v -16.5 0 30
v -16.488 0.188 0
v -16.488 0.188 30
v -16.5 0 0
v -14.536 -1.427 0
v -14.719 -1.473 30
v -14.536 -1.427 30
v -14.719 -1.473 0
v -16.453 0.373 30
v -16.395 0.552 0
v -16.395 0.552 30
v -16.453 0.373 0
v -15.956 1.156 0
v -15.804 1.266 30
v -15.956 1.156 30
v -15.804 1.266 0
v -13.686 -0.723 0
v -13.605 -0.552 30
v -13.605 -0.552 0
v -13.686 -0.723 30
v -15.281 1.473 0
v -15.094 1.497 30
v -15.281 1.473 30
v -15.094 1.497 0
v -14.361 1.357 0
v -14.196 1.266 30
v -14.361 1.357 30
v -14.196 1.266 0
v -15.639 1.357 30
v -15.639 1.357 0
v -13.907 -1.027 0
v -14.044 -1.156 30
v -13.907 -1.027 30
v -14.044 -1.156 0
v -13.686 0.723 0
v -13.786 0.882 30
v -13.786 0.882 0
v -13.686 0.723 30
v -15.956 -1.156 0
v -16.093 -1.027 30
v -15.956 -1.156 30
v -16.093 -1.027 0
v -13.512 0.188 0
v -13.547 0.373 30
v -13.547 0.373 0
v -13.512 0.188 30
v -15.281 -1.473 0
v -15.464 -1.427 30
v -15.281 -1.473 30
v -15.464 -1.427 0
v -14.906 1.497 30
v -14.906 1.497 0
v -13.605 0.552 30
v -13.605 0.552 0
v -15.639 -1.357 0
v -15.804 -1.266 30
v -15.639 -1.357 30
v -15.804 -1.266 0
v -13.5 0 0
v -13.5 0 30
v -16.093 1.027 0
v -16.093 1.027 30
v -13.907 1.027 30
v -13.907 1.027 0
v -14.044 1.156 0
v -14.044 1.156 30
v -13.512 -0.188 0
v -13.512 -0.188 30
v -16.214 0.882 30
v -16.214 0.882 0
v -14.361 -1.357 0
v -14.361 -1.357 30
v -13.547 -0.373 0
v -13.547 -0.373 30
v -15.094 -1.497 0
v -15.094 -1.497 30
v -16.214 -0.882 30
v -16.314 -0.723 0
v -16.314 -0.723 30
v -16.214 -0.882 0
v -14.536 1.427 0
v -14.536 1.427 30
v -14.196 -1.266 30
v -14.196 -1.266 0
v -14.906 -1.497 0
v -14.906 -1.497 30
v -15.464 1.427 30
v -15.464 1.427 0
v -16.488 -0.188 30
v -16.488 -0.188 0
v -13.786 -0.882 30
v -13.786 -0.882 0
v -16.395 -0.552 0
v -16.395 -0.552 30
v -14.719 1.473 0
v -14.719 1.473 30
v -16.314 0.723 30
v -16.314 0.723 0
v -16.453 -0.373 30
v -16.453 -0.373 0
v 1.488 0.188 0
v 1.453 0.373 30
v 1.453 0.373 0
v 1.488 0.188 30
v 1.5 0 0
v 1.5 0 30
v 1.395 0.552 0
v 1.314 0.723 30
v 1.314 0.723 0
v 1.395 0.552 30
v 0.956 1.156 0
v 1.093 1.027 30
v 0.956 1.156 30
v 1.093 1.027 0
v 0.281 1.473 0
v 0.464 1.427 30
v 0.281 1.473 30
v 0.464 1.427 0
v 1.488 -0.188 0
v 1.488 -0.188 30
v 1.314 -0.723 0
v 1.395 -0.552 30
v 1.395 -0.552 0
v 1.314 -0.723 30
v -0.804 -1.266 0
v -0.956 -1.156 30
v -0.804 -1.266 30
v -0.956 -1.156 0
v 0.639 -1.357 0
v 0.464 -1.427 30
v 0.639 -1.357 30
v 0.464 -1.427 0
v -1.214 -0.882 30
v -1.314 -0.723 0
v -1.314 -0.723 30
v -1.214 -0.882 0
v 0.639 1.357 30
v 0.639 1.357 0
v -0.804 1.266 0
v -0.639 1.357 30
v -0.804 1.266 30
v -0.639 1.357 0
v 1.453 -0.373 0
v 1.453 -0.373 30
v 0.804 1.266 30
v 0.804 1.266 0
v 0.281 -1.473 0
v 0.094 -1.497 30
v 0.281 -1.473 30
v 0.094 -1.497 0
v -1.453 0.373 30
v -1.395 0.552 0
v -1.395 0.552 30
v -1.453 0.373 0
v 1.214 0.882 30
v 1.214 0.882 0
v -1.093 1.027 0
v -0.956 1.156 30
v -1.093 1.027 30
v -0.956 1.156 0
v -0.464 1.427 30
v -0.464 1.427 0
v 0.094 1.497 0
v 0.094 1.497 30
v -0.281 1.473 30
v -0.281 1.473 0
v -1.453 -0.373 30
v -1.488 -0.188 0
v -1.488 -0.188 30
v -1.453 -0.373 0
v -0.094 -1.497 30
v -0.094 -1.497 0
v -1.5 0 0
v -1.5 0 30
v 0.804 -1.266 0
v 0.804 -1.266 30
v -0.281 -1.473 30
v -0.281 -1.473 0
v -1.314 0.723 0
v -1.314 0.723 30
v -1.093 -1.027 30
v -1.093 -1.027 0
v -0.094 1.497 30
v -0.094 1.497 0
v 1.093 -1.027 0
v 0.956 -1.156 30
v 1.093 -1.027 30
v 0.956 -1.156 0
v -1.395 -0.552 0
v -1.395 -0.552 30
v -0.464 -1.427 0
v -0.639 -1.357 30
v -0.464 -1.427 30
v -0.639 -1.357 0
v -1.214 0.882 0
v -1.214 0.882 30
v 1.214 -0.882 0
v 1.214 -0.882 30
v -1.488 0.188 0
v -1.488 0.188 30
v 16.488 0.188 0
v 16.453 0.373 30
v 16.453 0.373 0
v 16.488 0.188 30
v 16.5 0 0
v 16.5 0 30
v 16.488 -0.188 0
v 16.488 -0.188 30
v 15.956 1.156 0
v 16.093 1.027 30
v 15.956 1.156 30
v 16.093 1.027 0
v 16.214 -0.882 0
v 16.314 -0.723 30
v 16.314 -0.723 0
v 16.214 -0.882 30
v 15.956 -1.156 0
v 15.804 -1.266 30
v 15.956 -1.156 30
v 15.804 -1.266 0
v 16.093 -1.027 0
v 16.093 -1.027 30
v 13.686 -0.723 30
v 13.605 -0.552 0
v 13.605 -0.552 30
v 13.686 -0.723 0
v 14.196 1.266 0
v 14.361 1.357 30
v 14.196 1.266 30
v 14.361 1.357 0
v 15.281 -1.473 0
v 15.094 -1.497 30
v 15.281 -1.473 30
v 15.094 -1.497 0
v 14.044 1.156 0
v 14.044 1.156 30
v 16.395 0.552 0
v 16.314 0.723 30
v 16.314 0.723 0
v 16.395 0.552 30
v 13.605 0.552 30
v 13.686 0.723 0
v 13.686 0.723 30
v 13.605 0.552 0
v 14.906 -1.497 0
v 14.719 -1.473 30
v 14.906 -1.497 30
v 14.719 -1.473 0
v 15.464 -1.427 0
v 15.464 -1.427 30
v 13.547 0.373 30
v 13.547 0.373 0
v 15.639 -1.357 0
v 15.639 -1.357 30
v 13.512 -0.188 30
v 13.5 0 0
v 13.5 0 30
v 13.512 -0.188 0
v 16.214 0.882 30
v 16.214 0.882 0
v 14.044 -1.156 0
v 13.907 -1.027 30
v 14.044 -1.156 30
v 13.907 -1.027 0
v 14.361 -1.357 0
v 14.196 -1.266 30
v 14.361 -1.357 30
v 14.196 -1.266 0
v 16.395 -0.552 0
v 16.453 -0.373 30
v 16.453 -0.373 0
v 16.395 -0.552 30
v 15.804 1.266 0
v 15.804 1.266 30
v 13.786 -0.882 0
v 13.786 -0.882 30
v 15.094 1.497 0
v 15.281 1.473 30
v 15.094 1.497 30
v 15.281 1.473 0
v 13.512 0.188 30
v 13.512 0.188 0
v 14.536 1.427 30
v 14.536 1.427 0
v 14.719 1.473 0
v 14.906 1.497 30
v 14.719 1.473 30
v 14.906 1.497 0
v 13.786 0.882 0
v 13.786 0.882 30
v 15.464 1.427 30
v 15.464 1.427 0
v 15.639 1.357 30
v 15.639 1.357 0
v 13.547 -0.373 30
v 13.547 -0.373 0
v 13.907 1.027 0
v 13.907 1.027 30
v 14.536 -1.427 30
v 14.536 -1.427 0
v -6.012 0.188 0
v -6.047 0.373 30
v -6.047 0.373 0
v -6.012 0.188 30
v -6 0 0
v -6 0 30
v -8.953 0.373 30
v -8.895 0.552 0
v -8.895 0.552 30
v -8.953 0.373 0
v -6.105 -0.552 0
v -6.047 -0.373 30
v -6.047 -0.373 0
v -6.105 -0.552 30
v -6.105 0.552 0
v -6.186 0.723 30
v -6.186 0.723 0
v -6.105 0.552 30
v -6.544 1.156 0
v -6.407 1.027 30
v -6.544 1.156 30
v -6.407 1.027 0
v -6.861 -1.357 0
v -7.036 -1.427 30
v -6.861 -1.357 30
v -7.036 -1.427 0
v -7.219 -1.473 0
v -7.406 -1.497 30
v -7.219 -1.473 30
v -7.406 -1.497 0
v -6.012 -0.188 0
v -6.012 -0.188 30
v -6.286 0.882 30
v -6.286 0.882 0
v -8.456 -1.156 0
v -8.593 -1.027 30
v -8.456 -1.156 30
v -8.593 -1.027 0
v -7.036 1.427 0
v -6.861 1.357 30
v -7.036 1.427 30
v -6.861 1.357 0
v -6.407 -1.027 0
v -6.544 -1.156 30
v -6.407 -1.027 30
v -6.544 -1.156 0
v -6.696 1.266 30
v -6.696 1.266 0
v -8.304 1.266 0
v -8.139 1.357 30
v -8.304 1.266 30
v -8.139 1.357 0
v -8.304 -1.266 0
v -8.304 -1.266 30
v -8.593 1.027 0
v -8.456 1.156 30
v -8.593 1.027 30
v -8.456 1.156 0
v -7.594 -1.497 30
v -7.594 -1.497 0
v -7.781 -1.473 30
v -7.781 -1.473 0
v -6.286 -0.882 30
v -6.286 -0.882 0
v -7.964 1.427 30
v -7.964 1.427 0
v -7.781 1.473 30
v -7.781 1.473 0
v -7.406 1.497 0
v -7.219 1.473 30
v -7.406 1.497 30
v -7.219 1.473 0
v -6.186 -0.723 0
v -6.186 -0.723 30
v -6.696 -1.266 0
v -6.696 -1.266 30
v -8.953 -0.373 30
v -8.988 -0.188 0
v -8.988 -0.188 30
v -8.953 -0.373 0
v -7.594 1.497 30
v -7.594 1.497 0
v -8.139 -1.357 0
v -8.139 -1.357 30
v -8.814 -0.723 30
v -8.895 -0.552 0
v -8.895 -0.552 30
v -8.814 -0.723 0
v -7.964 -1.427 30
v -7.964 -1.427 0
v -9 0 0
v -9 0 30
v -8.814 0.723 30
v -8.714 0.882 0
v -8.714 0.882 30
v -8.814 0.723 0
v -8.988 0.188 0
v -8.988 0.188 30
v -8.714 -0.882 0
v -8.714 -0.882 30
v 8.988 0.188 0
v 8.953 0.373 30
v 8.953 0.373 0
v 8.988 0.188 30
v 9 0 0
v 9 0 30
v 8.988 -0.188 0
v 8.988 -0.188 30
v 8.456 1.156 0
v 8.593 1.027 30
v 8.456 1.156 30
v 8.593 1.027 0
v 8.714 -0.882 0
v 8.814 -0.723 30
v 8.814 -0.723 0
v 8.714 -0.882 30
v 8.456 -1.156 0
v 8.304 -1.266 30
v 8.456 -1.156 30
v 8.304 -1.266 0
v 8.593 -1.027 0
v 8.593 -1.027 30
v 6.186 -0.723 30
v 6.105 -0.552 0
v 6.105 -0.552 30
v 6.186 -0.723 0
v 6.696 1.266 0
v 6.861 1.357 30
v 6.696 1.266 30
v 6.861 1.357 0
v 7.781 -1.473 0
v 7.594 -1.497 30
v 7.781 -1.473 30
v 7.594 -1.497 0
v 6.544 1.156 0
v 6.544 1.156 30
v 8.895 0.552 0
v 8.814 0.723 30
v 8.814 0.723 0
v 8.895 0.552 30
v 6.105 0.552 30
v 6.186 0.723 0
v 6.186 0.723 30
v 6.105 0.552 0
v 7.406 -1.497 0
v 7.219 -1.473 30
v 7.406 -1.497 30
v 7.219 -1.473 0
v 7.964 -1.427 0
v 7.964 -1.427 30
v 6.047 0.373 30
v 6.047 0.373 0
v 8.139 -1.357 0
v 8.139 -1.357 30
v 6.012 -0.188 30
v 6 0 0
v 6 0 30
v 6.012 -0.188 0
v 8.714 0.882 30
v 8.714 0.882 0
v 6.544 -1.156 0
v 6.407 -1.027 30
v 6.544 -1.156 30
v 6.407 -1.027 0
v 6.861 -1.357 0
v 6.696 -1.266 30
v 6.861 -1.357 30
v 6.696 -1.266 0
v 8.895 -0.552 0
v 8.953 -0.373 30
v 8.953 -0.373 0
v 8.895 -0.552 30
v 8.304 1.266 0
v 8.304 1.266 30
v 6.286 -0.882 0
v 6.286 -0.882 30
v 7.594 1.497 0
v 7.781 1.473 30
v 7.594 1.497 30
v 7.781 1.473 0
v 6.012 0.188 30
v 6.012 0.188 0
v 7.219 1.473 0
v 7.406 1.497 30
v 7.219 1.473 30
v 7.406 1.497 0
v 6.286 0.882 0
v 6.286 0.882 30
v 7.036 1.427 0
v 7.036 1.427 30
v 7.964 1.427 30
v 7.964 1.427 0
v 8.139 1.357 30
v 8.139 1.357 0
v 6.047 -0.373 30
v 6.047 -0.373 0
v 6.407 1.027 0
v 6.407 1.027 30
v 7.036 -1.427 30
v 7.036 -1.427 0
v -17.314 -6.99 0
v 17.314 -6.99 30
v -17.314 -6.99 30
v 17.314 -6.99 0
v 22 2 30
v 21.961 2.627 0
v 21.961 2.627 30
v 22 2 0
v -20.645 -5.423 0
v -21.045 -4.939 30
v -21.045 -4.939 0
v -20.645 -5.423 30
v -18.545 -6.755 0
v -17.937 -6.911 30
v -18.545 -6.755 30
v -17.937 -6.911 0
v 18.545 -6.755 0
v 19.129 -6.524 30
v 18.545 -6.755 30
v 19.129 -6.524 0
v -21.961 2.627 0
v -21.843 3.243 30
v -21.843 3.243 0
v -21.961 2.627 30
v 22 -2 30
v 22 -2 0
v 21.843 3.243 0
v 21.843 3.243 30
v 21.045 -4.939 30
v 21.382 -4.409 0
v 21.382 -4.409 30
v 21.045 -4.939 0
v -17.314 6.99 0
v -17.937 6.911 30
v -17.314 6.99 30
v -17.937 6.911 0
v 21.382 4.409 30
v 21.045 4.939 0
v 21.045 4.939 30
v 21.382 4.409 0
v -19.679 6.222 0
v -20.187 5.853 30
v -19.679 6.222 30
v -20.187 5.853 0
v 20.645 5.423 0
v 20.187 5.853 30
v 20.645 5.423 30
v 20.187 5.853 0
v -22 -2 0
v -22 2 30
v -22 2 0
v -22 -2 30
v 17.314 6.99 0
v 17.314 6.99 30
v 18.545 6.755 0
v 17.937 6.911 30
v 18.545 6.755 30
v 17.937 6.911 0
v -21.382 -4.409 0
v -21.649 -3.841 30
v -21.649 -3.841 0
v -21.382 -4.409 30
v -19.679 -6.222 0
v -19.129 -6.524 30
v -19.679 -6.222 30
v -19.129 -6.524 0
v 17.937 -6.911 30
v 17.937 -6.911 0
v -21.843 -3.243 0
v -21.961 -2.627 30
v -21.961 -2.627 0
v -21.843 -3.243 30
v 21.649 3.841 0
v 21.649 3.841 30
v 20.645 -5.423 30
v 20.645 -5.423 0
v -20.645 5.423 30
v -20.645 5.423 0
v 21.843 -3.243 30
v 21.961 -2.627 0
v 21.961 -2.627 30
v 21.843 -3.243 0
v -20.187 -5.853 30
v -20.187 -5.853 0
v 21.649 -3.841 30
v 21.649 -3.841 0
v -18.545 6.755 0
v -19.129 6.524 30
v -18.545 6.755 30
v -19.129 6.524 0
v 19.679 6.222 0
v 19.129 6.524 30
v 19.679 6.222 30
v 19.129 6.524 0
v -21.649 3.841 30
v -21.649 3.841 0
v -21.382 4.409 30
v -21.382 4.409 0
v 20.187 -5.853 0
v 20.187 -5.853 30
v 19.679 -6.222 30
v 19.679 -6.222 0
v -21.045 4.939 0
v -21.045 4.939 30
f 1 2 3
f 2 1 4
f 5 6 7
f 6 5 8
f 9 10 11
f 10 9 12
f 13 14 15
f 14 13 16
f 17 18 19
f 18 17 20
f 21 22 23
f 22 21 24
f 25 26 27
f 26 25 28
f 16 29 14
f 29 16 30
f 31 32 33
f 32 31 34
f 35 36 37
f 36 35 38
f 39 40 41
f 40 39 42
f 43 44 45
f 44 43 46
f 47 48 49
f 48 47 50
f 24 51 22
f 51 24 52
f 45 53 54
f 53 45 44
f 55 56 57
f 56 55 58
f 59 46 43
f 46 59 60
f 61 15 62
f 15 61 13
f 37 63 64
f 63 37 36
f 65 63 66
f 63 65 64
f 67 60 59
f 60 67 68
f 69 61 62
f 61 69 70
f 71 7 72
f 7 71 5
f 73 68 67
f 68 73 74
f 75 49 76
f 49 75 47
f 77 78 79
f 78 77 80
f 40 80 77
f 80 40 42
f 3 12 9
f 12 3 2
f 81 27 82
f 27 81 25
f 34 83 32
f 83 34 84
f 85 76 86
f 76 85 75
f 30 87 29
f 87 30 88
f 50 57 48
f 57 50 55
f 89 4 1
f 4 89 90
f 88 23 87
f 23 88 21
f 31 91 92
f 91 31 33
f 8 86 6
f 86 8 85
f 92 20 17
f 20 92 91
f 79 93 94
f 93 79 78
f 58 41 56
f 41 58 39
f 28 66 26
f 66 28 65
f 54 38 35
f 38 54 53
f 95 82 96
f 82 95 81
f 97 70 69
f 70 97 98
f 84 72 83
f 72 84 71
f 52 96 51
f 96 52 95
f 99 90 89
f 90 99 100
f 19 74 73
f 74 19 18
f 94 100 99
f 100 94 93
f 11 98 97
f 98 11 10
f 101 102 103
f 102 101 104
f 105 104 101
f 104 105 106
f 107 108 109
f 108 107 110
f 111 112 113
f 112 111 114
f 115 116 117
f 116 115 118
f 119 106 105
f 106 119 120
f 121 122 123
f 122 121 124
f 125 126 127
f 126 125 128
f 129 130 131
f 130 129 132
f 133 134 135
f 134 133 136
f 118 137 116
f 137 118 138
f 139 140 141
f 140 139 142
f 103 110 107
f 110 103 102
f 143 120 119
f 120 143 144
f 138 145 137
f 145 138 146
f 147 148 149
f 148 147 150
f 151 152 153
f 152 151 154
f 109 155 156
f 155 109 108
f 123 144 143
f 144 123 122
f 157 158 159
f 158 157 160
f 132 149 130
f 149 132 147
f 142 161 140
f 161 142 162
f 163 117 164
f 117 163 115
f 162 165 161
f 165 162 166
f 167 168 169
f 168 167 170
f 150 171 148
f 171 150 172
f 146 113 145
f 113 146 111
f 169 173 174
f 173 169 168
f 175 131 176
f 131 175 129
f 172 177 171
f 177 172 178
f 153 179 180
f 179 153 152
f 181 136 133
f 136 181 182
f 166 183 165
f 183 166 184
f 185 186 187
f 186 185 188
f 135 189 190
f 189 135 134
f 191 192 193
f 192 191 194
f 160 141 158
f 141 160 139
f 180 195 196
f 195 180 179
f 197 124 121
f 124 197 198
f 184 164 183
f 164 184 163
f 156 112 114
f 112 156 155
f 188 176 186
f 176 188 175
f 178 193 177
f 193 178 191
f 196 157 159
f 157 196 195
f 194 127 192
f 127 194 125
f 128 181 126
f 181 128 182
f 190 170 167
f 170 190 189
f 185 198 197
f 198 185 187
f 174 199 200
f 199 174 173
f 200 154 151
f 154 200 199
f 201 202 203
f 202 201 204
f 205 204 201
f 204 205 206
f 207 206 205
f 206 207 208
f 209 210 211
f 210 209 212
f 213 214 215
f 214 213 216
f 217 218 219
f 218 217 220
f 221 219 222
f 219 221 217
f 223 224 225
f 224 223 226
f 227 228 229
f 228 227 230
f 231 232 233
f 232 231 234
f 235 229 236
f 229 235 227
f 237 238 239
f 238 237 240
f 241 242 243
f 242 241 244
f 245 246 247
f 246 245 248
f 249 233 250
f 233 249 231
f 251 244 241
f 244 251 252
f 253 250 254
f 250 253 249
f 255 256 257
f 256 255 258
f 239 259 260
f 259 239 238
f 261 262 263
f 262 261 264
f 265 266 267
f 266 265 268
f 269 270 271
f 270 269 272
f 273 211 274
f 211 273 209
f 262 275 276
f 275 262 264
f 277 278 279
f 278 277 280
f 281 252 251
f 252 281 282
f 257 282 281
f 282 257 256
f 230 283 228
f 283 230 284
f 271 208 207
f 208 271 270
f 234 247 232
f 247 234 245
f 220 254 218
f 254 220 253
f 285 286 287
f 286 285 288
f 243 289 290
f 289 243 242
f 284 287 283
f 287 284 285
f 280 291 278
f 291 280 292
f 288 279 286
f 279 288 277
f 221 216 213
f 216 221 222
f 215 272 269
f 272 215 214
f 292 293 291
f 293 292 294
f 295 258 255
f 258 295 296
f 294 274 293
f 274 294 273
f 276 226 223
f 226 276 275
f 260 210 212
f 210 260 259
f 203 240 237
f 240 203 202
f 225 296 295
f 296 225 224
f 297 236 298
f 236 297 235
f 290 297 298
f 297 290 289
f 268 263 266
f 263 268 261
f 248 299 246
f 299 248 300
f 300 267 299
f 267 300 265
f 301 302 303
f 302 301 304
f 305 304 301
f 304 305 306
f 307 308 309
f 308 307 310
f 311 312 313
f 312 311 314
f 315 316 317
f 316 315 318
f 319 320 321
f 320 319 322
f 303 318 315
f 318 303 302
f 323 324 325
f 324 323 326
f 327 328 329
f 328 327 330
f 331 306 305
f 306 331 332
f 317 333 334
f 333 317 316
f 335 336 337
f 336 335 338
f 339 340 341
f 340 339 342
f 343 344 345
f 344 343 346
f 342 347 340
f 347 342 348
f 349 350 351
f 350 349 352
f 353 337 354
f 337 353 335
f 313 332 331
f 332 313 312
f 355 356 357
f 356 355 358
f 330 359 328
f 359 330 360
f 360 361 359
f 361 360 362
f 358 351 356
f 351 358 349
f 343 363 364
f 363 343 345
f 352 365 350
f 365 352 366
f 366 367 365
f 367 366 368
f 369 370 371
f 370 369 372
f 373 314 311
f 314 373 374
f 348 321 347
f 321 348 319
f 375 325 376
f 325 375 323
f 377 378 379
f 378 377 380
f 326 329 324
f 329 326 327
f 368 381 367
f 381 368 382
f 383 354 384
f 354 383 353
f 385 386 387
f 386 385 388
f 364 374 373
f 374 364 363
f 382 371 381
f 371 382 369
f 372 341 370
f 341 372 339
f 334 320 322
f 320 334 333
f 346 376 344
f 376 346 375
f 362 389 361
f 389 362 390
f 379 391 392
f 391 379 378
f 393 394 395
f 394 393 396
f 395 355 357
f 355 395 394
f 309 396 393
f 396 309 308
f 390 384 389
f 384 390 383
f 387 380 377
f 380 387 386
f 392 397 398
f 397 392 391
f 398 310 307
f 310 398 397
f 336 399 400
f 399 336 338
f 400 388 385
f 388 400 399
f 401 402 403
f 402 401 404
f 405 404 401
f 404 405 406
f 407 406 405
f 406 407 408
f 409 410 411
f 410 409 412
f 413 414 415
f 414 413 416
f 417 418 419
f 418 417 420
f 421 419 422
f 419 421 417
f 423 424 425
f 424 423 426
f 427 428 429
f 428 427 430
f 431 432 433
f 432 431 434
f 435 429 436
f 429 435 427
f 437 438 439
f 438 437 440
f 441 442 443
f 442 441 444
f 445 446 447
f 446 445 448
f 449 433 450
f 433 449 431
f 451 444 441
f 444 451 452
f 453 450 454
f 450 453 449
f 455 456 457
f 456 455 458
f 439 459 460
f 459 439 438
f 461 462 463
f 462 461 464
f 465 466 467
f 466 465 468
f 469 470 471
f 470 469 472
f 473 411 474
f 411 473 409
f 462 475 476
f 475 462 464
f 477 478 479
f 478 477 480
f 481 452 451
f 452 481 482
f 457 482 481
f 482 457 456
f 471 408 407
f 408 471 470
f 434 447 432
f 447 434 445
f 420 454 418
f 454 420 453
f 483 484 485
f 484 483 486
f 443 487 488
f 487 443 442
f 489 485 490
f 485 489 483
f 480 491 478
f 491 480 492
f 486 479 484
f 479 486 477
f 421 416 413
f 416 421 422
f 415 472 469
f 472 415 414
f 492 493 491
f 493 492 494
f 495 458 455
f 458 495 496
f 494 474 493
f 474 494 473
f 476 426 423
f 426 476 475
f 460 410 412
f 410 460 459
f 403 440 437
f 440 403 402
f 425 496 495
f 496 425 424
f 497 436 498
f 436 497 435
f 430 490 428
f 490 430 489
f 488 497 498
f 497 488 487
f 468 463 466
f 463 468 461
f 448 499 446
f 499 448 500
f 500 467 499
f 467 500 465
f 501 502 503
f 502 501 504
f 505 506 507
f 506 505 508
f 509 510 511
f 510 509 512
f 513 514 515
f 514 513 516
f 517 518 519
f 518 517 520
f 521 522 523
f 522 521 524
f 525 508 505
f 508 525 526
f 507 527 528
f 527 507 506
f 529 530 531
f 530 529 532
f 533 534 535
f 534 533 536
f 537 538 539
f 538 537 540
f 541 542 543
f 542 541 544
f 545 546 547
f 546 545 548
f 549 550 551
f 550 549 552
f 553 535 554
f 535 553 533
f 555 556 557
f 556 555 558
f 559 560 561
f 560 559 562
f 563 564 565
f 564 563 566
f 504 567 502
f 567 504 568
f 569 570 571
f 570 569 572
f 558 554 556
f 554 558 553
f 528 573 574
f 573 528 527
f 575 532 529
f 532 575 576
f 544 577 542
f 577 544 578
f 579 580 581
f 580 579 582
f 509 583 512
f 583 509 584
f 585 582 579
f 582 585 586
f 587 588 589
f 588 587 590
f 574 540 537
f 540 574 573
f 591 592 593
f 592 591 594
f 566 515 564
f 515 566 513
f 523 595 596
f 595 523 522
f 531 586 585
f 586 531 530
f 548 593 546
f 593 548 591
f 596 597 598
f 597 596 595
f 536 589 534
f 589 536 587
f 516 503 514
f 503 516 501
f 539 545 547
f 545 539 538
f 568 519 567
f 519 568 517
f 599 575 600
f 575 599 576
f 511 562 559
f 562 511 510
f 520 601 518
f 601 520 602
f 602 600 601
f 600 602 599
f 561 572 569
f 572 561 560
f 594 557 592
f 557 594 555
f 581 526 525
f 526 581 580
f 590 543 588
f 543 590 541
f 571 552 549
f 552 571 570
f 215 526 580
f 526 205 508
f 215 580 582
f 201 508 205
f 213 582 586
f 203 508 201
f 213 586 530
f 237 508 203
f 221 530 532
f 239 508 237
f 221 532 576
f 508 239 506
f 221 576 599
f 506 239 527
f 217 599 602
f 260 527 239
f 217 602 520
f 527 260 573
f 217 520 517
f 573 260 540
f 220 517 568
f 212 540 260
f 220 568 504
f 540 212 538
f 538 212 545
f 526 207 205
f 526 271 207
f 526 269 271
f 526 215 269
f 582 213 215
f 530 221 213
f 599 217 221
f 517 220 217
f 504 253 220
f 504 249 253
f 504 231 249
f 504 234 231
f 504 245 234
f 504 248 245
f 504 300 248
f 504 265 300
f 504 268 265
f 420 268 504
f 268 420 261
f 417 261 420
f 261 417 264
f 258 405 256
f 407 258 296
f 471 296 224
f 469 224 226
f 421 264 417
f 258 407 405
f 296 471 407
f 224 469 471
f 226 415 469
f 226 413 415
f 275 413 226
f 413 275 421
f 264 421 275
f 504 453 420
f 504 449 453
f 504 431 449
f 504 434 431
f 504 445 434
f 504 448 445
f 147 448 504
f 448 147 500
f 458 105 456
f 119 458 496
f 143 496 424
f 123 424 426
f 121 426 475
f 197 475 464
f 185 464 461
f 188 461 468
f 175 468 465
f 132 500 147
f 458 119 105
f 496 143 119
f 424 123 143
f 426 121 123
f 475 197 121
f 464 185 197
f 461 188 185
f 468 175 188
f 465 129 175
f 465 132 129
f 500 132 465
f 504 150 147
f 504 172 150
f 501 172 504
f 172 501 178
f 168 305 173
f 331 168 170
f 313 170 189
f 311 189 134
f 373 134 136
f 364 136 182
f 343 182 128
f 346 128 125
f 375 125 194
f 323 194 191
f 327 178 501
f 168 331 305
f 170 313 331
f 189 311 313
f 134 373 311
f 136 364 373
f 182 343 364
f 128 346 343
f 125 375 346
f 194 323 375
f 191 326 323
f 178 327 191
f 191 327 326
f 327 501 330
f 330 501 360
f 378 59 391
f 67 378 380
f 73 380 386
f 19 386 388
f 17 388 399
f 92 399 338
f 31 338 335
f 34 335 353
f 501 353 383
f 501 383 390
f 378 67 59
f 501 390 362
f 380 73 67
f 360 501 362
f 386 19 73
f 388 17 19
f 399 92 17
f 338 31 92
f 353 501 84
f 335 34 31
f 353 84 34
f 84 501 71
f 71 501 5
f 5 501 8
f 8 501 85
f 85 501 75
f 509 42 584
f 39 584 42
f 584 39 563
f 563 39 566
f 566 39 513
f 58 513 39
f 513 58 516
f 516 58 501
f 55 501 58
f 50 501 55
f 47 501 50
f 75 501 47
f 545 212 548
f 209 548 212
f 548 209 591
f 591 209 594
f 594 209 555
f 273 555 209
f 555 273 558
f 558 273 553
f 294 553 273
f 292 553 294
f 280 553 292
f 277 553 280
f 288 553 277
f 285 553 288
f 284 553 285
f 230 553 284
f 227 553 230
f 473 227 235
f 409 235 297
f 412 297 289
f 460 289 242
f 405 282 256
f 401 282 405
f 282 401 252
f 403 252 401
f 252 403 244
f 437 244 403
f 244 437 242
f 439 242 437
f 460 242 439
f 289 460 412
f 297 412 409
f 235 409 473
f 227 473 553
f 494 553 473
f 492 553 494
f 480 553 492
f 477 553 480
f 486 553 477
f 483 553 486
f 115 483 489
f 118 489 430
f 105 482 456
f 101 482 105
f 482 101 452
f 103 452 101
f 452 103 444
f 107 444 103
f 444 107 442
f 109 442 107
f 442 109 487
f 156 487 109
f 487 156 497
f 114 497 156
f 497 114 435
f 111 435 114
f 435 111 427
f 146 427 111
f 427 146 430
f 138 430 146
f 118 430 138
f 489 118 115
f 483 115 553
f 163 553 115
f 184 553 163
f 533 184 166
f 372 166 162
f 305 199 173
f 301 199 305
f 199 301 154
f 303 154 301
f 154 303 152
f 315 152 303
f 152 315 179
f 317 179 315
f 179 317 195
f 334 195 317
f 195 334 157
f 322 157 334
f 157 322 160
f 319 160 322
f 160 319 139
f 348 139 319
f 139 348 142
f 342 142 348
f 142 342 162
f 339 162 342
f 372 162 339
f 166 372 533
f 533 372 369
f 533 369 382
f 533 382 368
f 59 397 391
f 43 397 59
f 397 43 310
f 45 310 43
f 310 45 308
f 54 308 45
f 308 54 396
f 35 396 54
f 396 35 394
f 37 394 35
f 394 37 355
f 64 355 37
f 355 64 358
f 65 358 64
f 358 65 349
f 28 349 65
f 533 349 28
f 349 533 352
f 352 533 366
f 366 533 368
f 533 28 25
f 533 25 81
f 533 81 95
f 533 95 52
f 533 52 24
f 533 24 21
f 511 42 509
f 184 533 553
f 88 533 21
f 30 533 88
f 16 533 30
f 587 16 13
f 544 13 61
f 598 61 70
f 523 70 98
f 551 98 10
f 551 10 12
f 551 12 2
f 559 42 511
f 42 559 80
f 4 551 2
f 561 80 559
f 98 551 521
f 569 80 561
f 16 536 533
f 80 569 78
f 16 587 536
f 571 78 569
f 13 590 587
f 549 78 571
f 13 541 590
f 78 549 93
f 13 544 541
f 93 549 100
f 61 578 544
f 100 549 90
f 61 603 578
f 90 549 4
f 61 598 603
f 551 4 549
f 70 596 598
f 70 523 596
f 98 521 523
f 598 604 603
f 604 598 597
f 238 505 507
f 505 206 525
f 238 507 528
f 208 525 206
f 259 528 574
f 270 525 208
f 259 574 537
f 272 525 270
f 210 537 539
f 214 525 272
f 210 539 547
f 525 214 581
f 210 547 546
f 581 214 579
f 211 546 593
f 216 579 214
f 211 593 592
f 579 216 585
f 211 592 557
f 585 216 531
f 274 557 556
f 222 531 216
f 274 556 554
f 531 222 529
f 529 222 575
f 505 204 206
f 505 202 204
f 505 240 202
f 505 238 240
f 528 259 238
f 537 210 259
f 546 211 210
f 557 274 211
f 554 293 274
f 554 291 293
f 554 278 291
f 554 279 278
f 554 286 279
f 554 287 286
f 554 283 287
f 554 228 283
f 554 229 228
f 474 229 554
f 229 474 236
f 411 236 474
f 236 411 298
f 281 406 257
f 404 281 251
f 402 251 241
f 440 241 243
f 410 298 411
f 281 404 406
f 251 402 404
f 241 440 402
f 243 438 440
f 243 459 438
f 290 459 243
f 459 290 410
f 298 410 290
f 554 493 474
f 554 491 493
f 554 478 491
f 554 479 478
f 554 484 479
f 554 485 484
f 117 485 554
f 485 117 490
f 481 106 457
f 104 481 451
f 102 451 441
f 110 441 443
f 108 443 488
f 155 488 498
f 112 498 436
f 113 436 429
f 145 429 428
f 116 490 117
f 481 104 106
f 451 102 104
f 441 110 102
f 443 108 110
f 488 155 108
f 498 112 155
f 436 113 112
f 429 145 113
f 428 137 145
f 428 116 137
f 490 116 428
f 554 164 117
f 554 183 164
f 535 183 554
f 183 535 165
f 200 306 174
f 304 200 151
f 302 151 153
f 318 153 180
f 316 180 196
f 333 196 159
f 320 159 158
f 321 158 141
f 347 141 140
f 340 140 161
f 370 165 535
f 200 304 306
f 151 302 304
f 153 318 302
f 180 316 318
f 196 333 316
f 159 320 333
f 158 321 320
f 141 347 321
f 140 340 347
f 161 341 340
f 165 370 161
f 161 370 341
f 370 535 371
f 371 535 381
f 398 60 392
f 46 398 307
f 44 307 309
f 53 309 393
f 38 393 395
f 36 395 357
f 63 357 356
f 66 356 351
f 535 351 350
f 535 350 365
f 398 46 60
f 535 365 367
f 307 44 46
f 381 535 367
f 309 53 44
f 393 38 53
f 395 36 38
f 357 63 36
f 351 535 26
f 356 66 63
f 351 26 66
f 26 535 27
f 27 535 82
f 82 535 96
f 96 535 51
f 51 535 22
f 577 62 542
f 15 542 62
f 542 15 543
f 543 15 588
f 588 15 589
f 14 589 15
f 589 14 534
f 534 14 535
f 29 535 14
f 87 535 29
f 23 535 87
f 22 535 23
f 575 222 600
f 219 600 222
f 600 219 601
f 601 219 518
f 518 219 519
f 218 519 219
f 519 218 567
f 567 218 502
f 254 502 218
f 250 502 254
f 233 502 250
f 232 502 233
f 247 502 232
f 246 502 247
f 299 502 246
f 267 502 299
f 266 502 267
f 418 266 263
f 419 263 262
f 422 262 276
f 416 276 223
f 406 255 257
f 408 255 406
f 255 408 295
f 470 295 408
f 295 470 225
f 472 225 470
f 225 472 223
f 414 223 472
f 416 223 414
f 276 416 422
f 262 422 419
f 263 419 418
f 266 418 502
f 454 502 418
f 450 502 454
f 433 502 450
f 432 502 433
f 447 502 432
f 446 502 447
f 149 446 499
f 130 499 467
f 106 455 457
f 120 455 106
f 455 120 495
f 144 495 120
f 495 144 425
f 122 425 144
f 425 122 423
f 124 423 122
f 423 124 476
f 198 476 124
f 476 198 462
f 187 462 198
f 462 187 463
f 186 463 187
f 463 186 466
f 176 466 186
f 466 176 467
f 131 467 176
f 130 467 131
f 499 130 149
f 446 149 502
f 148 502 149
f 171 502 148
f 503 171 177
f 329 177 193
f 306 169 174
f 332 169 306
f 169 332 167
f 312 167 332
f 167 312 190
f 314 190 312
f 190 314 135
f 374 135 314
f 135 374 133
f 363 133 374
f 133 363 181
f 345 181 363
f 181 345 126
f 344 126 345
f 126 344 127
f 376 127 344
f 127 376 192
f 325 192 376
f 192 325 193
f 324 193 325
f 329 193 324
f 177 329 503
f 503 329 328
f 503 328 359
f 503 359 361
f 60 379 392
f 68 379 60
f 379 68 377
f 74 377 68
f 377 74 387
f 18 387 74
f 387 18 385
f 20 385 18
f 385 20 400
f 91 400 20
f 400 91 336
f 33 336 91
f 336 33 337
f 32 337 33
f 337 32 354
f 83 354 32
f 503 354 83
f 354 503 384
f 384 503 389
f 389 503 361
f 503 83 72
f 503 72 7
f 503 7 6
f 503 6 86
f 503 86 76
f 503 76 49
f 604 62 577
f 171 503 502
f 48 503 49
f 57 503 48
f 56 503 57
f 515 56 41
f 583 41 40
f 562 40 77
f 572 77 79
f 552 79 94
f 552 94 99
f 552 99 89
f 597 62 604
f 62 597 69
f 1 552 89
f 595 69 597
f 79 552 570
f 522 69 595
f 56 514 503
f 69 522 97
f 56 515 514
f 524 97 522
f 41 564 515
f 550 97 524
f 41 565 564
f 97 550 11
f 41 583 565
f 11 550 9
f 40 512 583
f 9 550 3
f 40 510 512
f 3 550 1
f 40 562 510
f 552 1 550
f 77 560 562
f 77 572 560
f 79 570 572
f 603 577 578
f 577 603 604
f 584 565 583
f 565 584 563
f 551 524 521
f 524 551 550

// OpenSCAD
$fn = 50;


difference() {
	union() {
		hull() {
			translate(v = [-17.0000000000, 2.0000000000, 0]) {
				cylinder(h = 30, r = 5);
			}
			translate(v = [17.0000000000, 2.0000000000, 0]) {
				cylinder(h = 30, r = 5);
			}
			translate(v = [-17.0000000000, -2.0000000000, 0]) {
				cylinder(h = 30, r = 5);
			}
			translate(v = [17.0000000000, -2.0000000000, 0]) {
				cylinder(h = 30, r = 5);
			}
		}
	}
	union() {
		translate(v = [-15.0000000000, 0.0000000000, 0]) {
			translate(v = [0, 0, -100]) {
				cylinder(h = 200, r = 1.5000000000);
			}
		}
		translate(v = [0, 0, -100]) {
			cylinder(h = 200, r = 1.5000000000);
		}
		translate(v = [15.0000000000, 0.0000000000, 0]) {
			translate(v = [0, 0, -100]) {
				cylinder(h = 200, r = 1.5000000000);
			}
		}
		translate(v = [-15.0000000000, 0.0000000000, 0]) {
			translate(v = [0, 0, -100]) {
				cylinder(h = 200, r = 1.5000000000);
			}
		}
		translate(v = [-7.5000000000, 0.0000000000, 0]) {
			translate(v = [0, 0, -100]) {
				cylinder(h = 200, r = 1.5000000000);
			}
		}
		translate(v = [0, 0, -100]) {
			cylinder(h = 200, r = 1.5000000000);
		}
		translate(v = [7.5000000000, 0.0000000000, 0]) {
			translate(v = [0, 0, -100]) {
				cylinder(h = 200, r = 1.5000000000);
			}
		}
		translate(v = [15.0000000000, 0.0000000000, 0]) {
			translate(v = [0, 0, -100]) {
				cylinder(h = 200, r = 1.5000000000);
			}
		}
	}
}
